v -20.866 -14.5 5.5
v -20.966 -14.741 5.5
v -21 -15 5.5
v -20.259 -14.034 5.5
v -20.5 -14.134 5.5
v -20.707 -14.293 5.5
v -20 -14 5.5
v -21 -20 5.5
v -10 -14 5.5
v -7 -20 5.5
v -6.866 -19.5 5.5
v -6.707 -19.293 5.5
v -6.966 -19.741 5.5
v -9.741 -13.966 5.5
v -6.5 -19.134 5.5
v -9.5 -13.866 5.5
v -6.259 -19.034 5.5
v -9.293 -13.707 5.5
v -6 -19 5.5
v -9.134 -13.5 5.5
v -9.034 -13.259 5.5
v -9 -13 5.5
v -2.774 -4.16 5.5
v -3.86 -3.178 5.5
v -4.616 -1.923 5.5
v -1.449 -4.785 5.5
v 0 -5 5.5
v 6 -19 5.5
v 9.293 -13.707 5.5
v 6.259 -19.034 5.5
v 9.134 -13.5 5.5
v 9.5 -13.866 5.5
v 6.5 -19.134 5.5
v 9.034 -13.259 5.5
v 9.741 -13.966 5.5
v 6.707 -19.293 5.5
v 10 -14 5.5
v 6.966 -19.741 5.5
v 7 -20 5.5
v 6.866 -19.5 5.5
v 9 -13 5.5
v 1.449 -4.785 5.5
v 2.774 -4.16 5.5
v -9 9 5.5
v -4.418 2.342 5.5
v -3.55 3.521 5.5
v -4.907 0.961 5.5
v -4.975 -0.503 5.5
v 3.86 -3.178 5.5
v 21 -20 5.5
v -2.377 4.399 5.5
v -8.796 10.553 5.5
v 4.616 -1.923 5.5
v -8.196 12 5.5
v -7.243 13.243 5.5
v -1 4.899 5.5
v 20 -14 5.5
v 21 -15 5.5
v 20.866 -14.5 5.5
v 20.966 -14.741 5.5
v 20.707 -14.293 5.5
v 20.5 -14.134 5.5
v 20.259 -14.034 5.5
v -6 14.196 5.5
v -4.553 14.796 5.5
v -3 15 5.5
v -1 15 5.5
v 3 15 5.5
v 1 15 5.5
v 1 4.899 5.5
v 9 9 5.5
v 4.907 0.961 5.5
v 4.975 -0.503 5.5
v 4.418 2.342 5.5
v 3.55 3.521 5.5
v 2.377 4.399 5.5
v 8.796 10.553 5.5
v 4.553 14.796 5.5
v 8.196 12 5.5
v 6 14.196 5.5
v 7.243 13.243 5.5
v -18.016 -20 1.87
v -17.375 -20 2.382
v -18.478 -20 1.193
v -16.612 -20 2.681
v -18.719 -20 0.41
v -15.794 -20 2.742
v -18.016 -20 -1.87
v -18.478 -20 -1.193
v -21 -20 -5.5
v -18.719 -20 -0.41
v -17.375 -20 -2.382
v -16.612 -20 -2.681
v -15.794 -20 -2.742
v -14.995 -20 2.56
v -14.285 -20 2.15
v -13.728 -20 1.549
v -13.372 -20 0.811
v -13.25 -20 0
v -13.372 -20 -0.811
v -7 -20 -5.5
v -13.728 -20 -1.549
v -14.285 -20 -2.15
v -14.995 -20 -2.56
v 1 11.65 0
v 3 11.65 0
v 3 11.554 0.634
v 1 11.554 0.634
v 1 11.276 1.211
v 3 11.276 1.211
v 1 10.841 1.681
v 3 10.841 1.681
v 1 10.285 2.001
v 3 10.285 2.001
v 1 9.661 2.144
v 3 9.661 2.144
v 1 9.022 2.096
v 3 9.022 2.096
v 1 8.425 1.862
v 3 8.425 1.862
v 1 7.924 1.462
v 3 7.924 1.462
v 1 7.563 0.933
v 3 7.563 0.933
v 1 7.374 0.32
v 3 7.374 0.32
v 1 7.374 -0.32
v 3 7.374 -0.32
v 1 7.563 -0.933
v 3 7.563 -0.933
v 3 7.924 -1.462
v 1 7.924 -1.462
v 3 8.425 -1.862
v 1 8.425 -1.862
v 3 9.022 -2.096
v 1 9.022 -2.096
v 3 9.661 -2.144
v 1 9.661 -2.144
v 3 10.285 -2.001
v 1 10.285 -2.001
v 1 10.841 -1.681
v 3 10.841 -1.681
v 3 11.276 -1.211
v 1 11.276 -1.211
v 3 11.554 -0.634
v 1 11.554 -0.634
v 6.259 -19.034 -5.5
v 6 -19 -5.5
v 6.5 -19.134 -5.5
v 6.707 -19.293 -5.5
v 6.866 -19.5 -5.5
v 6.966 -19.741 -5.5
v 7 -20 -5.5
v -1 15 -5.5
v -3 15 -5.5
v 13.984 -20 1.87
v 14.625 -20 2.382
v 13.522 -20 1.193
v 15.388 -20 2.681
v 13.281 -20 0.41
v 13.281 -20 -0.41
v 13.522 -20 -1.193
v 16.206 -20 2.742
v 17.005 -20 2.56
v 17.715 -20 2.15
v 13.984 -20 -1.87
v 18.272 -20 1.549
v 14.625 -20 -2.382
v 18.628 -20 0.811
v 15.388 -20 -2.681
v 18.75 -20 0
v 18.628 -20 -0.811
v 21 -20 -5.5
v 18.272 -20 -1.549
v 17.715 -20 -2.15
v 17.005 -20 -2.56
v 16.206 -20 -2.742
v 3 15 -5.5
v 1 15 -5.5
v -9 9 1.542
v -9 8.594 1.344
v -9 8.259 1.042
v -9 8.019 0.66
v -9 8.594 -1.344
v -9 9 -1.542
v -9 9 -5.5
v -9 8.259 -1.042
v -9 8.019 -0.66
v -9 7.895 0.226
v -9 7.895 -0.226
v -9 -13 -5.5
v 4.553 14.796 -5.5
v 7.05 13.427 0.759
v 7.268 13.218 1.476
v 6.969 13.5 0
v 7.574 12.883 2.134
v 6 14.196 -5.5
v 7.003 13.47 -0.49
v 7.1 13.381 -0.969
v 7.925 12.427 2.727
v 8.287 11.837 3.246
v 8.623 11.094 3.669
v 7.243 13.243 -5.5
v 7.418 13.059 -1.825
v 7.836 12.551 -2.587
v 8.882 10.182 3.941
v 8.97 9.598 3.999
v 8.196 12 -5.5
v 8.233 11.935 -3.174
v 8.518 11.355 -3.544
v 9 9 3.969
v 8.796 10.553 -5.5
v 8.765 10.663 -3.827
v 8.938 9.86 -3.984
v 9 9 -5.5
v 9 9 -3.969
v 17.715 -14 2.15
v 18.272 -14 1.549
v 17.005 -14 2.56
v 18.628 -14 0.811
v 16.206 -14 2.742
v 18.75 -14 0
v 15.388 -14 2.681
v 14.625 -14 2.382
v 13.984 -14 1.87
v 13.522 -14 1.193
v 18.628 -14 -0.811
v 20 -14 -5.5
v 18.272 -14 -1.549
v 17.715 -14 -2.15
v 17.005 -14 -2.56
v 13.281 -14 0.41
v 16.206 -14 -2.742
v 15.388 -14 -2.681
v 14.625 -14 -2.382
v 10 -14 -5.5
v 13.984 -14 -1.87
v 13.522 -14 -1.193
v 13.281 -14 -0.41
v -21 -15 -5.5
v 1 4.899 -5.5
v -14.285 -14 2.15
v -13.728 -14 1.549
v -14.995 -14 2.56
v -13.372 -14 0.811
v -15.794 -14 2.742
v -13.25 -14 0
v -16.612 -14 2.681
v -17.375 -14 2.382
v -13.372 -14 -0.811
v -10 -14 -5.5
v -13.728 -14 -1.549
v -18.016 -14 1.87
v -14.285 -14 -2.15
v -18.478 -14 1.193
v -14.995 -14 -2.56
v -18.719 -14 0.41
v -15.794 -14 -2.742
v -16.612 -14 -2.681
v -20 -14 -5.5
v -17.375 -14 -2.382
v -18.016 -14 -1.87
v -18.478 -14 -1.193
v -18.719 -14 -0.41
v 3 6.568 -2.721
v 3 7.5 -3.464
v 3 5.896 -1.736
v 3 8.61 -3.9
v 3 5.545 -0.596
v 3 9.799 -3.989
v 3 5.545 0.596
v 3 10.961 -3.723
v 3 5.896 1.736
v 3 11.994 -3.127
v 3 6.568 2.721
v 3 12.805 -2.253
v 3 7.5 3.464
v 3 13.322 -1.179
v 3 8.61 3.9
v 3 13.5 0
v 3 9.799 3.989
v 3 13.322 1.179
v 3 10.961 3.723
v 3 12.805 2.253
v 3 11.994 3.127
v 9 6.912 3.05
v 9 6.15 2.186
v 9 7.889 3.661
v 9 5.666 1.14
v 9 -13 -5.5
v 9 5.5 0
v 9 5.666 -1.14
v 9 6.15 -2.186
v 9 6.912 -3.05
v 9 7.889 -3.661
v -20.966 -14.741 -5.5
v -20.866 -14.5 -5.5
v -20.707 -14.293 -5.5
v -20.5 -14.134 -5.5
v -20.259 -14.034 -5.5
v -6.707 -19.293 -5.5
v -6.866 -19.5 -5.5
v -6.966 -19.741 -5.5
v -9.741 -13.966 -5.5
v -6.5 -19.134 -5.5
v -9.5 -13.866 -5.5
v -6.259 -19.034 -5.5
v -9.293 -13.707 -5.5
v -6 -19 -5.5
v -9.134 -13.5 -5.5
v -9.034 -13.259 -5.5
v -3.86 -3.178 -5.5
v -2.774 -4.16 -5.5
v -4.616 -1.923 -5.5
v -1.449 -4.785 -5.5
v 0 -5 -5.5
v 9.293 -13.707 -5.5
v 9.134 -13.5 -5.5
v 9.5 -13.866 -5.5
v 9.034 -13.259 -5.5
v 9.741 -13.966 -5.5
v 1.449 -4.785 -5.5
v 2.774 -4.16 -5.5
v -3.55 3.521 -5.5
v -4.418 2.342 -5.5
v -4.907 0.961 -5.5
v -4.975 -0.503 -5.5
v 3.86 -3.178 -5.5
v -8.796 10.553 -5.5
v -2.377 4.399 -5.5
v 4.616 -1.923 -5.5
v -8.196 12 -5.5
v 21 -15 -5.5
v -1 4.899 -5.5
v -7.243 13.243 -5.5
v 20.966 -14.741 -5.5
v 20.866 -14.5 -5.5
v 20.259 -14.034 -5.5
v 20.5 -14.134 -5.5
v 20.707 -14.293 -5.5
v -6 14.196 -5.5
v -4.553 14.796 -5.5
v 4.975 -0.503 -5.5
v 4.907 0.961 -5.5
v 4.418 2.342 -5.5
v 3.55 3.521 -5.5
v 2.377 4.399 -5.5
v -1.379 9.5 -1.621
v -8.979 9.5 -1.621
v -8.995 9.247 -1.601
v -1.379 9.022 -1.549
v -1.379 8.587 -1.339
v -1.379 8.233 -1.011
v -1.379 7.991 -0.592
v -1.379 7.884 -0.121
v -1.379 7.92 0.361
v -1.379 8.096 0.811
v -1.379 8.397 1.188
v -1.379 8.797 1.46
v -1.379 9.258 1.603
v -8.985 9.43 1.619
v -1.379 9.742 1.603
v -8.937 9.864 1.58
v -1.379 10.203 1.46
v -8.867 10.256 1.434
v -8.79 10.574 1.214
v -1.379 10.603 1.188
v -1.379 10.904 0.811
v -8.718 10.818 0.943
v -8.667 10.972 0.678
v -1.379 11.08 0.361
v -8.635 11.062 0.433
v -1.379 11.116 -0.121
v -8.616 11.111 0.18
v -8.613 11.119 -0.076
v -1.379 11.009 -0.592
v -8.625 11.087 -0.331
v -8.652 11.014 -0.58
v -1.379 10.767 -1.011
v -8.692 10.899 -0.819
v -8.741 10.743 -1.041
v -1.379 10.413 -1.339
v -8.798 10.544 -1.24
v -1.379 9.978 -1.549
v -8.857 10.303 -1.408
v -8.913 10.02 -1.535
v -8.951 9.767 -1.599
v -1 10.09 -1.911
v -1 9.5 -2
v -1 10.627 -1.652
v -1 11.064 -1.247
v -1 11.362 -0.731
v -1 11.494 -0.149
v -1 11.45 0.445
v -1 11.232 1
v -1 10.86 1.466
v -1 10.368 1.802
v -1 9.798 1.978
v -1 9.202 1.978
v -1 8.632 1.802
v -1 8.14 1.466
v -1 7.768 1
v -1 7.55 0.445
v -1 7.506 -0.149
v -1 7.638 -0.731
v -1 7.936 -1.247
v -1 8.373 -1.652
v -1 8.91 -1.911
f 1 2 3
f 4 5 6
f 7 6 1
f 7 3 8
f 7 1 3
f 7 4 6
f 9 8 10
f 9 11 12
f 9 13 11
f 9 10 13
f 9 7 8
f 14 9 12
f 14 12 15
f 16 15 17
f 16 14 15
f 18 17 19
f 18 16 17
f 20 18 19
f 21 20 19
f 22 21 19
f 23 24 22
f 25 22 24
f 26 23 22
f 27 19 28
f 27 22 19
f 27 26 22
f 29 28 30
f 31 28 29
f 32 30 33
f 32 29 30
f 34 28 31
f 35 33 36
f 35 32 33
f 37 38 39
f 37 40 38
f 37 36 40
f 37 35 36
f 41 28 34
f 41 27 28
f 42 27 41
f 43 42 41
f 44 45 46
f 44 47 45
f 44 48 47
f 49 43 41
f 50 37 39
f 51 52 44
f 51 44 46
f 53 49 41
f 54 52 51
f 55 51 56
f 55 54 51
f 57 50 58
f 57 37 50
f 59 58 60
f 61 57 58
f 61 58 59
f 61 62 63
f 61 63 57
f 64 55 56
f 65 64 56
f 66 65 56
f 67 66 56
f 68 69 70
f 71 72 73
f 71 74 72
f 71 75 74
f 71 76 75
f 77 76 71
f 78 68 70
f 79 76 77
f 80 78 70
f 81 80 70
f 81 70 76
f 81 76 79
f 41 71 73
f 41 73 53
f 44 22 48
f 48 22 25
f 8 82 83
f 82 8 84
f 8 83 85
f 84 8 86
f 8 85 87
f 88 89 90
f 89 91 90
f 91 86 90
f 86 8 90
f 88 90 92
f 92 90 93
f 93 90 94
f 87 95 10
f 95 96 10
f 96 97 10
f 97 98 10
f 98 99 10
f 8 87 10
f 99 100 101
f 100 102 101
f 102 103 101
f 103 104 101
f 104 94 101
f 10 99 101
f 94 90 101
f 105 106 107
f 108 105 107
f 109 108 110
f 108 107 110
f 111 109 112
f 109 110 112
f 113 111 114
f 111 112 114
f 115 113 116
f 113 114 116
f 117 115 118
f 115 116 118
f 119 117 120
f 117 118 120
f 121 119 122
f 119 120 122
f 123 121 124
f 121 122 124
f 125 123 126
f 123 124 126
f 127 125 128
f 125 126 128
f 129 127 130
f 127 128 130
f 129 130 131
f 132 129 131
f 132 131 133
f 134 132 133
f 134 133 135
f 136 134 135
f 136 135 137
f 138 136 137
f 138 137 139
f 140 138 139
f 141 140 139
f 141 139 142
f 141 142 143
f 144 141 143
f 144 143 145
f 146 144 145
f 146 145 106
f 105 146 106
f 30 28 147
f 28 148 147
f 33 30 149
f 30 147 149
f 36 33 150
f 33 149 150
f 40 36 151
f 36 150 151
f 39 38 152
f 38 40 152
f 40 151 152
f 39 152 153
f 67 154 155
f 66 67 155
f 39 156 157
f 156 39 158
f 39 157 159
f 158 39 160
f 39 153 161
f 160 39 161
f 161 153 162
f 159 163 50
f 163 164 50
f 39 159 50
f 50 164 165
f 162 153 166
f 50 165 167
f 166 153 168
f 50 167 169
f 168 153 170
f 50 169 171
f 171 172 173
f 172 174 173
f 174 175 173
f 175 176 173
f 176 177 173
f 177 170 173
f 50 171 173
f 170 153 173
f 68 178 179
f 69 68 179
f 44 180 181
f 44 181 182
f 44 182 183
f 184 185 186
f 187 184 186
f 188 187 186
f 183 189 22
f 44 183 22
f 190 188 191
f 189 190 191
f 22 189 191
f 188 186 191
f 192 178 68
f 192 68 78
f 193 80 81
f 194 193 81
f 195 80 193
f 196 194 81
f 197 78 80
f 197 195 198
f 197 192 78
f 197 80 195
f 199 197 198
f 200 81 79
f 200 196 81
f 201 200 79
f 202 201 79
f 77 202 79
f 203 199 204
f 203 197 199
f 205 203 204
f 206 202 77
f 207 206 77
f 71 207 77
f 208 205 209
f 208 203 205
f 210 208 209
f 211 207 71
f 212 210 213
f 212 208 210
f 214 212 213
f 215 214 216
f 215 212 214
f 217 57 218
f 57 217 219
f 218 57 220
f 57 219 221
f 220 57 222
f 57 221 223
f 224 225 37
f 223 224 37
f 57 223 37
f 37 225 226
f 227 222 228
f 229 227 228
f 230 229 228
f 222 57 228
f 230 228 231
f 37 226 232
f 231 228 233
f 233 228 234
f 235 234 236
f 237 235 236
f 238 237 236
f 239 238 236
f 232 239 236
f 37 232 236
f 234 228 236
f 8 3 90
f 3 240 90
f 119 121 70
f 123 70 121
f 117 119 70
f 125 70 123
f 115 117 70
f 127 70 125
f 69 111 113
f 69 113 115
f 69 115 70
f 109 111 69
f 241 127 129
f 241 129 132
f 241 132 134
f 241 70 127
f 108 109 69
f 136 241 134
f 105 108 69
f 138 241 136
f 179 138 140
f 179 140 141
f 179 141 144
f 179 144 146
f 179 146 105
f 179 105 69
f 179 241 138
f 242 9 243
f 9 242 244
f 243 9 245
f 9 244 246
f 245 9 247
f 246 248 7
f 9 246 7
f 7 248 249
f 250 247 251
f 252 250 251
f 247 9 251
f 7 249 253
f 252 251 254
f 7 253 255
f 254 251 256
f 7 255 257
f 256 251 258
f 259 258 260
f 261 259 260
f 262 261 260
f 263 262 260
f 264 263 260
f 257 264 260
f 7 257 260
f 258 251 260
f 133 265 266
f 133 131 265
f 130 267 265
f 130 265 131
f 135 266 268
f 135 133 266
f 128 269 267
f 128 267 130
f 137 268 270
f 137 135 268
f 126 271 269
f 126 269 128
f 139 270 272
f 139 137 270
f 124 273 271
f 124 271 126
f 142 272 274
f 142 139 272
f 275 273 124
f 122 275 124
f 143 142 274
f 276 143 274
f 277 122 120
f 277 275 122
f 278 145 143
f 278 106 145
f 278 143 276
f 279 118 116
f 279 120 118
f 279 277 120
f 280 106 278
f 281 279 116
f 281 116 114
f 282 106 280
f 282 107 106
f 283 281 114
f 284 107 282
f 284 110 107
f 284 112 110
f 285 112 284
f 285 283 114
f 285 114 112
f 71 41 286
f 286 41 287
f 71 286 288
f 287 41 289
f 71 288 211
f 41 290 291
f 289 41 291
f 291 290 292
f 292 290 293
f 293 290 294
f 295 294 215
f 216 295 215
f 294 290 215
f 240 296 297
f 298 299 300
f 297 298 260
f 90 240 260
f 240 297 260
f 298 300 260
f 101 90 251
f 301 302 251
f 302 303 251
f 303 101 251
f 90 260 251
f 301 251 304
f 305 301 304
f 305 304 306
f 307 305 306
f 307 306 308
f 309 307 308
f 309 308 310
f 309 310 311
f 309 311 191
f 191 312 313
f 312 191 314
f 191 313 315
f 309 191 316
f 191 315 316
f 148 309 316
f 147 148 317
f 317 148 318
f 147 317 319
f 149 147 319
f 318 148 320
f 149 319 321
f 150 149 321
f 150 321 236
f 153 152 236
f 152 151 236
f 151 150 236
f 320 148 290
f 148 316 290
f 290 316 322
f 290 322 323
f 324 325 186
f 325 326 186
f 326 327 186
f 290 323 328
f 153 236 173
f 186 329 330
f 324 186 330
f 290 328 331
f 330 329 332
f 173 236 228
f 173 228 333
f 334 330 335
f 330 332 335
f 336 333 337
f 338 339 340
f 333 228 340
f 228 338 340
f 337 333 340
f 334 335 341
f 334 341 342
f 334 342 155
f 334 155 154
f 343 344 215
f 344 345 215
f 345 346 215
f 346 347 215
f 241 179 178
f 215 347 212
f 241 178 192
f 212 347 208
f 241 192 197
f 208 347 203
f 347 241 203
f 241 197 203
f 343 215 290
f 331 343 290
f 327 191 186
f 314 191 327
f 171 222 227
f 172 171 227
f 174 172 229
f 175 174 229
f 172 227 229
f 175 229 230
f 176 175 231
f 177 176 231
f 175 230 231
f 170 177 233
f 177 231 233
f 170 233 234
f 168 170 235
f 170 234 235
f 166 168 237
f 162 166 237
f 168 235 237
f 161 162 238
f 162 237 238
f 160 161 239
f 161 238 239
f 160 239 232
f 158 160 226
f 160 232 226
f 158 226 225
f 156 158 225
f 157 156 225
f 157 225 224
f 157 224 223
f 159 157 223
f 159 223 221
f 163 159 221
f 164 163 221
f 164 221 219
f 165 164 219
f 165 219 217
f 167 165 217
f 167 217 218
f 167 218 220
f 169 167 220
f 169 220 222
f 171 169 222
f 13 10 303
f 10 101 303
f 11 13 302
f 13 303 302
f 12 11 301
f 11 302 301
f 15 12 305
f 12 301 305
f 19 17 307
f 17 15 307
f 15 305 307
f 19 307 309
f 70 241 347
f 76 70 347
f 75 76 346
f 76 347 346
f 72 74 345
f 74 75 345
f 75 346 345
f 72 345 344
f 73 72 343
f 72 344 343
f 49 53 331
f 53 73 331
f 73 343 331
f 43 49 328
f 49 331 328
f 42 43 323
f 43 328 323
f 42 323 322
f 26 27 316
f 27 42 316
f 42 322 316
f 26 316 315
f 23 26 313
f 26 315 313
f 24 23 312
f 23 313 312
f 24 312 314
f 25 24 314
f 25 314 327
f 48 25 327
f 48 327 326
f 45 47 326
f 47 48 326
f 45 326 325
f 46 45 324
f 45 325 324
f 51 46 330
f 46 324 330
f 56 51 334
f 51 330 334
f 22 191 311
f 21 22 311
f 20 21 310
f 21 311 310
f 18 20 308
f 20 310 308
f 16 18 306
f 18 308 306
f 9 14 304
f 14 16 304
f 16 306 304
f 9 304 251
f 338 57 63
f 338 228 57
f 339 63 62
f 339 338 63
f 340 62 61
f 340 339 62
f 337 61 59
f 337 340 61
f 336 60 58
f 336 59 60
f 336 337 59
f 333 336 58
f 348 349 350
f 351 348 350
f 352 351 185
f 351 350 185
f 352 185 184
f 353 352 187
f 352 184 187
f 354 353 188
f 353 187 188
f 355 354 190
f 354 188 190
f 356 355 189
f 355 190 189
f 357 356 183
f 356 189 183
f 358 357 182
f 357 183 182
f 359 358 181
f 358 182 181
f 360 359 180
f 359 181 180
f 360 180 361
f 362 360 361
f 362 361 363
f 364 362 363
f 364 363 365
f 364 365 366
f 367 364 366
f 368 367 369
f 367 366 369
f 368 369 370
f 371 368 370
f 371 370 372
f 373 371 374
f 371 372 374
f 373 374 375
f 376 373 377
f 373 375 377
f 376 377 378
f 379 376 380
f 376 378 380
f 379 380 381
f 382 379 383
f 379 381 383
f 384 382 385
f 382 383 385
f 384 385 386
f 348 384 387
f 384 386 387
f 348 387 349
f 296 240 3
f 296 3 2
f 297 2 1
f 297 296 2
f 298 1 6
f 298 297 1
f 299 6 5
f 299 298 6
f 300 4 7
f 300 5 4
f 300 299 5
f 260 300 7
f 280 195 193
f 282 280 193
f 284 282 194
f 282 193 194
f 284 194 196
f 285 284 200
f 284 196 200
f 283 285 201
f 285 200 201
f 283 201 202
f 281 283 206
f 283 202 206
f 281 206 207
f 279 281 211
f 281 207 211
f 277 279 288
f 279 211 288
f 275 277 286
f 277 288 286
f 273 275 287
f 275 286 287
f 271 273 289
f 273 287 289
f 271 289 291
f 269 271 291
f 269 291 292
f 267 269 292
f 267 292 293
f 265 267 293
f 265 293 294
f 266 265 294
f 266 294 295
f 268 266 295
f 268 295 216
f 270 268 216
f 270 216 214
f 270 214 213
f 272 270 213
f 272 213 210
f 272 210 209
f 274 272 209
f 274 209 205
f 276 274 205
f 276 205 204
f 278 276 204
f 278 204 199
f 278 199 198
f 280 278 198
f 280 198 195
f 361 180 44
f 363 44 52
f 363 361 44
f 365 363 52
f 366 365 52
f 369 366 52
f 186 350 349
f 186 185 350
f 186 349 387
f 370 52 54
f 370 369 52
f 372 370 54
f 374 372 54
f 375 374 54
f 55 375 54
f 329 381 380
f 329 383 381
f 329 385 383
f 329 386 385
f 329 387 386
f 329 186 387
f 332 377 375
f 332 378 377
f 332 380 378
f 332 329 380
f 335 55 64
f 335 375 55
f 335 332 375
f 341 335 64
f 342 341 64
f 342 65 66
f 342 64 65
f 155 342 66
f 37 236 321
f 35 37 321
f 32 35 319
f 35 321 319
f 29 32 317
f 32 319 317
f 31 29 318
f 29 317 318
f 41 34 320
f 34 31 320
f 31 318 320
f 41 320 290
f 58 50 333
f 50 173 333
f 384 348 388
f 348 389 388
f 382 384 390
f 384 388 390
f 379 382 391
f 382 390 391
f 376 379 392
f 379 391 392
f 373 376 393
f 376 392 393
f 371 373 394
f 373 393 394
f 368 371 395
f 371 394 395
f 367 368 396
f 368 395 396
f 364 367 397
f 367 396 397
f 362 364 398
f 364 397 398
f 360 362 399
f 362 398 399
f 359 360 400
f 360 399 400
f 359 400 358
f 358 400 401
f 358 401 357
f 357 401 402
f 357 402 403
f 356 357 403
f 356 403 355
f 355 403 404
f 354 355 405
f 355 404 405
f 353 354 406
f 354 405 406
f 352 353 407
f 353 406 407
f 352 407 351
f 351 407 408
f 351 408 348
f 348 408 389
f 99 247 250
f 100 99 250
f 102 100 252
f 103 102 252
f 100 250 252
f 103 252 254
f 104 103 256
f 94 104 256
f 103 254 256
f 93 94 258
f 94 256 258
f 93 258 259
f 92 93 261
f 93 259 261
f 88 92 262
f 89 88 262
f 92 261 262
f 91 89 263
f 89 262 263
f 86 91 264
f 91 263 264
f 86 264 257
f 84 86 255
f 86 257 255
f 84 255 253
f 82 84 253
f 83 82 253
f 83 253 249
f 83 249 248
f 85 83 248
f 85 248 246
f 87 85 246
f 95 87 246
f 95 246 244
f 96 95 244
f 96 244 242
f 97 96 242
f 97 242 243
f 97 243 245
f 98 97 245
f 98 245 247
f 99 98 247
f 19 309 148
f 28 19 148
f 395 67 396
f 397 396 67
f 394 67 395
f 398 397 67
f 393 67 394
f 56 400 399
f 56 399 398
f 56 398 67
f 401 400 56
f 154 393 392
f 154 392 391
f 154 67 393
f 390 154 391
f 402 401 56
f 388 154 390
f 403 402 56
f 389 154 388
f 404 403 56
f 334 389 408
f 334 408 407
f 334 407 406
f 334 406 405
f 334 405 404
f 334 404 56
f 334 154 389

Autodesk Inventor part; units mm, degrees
sketch "_____1" plane through (0, 0, 0) normal (0, 0, 1) x (1, 0, 0)
  line L0 (-21, -15) -> (-21, -20)
  line L1 (-21, -20) -> (-7, -20)
  arc A0 (-6, -19) -> (-7, -20) centre (-6, -20) ccw
  line L2 (-6, -19) -> (6, -19)
  arc A1 (7, -20) -> (6, -19) centre (6, -20) ccw
  line L3 (7, -20) -> (21, -20)
  line L4 (21, -20) -> (21, -15)
  arc A2 (21, -15) -> (20, -14) centre (20, -15) ccw
  line L5 (20, -14) -> (10, -14)
  arc A3 (9, -13) -> (10, -14) centre (10, -13) ccw
  line L6 (9, -13) -> (9, 9)
  arc A4 (9, 9) -> (3, 15) centre (3, 9) ccw
  line L7 (3, 15) -> (-3, 15)
  arc A5 (-3, 15) -> (-9, 9) centre (-3, 9) ccw
  line L8 (-9, 9) -> (-9, -13)
  arc A6 (-10, -14) -> (-9, -13) centre (-10, -13) ccw
  line L9 (-10, -14) -> (-20, -14)
  arc A7 (-20, -14) -> (-21, -15) centre (-20, -15) ccw
extrude "Extrusion1" add sketch "_____1" along normal mid plane 11
sketch "_____2" plane through (0, 0, 0) normal (0, 0, 1) x (1, 0, 0)
  arc A0 (-1, 4.899) -> (1, 4.899) centre (0, 0) ccw
  line L0 (1, 4.899) -> (1, 35)
  line L1 (1, 35) -> (-1, 35)
  line L2 (-1, 35) -> (-1, 4.899)
extrude "Extrusion2" cut sketch "_____2" along normal mid plane 11
sketch "_____3" plane through (0, 0, 0) normal (0, 1, 0) x (1, 0, 0)
  circle A0 centre (16, 0) radius 2.75
extrude "Extrusion3" cut sketch "_____3" against normal blind 20
sketch "_____4" plane through (0, 0, 0) normal (0, 1, 0) x (1, 0, 0)
  circle A0 centre (-16, 0) radius 2.75
extrude "Extrusion4" cut sketch "_____4" against normal blind 20
sketch "_____5" plane through (0, 0, 0) normal (0, 0, 1) x (1, 0, 0)
  line L0 (50, 9.5) -> (-50, 9.5)
  line L1 (0, 9.5) -> (0, 11.65)
  line L2 (0, 11.65) -> (3, 11.65)
  line L3 (3, 11.65) -> (3, 13.5)
  line L4 (3, 13.5) -> (9, 13.5)
  line L5 (9, 13.5) -> (9, 9.5)
  line L6 (9, 9.5) -> (0, 9.5)
revolve "Revolution1" cut sketch "_____5" angle 360 about axis through (50, 9.5, 0) along (1, 0, 0)
sketch "Sketch6" plane through (-1, 4.899, 5.5) normal (1, 0, 0) x (0, 0, -1)
  point P0 (5.5, 4.601)
hole "Hole1" at (-1, 9.5, 0) direction (-1, 0, 0) diameter 3.242 depth 8 countersink diameter 4 countersink angle 90 thread size "M4x0.7" class "6H" standard "ISO Metric profile"
ref_plane "to_bolt_XY" through (3, 9.5, 0) normal (1, 0, 0) x (0, 0, -1)
ref_plane "to_bolt_YZ" through (3, 9.5, 0) normal (0, 0, -1) x (0, 1, 0)
ref_plane "to_bolt_ZX" through (3, 9.5, 0) normal (0, 1, 0) x (1, 0, 0)
properties part number "C-SHA10_b"
